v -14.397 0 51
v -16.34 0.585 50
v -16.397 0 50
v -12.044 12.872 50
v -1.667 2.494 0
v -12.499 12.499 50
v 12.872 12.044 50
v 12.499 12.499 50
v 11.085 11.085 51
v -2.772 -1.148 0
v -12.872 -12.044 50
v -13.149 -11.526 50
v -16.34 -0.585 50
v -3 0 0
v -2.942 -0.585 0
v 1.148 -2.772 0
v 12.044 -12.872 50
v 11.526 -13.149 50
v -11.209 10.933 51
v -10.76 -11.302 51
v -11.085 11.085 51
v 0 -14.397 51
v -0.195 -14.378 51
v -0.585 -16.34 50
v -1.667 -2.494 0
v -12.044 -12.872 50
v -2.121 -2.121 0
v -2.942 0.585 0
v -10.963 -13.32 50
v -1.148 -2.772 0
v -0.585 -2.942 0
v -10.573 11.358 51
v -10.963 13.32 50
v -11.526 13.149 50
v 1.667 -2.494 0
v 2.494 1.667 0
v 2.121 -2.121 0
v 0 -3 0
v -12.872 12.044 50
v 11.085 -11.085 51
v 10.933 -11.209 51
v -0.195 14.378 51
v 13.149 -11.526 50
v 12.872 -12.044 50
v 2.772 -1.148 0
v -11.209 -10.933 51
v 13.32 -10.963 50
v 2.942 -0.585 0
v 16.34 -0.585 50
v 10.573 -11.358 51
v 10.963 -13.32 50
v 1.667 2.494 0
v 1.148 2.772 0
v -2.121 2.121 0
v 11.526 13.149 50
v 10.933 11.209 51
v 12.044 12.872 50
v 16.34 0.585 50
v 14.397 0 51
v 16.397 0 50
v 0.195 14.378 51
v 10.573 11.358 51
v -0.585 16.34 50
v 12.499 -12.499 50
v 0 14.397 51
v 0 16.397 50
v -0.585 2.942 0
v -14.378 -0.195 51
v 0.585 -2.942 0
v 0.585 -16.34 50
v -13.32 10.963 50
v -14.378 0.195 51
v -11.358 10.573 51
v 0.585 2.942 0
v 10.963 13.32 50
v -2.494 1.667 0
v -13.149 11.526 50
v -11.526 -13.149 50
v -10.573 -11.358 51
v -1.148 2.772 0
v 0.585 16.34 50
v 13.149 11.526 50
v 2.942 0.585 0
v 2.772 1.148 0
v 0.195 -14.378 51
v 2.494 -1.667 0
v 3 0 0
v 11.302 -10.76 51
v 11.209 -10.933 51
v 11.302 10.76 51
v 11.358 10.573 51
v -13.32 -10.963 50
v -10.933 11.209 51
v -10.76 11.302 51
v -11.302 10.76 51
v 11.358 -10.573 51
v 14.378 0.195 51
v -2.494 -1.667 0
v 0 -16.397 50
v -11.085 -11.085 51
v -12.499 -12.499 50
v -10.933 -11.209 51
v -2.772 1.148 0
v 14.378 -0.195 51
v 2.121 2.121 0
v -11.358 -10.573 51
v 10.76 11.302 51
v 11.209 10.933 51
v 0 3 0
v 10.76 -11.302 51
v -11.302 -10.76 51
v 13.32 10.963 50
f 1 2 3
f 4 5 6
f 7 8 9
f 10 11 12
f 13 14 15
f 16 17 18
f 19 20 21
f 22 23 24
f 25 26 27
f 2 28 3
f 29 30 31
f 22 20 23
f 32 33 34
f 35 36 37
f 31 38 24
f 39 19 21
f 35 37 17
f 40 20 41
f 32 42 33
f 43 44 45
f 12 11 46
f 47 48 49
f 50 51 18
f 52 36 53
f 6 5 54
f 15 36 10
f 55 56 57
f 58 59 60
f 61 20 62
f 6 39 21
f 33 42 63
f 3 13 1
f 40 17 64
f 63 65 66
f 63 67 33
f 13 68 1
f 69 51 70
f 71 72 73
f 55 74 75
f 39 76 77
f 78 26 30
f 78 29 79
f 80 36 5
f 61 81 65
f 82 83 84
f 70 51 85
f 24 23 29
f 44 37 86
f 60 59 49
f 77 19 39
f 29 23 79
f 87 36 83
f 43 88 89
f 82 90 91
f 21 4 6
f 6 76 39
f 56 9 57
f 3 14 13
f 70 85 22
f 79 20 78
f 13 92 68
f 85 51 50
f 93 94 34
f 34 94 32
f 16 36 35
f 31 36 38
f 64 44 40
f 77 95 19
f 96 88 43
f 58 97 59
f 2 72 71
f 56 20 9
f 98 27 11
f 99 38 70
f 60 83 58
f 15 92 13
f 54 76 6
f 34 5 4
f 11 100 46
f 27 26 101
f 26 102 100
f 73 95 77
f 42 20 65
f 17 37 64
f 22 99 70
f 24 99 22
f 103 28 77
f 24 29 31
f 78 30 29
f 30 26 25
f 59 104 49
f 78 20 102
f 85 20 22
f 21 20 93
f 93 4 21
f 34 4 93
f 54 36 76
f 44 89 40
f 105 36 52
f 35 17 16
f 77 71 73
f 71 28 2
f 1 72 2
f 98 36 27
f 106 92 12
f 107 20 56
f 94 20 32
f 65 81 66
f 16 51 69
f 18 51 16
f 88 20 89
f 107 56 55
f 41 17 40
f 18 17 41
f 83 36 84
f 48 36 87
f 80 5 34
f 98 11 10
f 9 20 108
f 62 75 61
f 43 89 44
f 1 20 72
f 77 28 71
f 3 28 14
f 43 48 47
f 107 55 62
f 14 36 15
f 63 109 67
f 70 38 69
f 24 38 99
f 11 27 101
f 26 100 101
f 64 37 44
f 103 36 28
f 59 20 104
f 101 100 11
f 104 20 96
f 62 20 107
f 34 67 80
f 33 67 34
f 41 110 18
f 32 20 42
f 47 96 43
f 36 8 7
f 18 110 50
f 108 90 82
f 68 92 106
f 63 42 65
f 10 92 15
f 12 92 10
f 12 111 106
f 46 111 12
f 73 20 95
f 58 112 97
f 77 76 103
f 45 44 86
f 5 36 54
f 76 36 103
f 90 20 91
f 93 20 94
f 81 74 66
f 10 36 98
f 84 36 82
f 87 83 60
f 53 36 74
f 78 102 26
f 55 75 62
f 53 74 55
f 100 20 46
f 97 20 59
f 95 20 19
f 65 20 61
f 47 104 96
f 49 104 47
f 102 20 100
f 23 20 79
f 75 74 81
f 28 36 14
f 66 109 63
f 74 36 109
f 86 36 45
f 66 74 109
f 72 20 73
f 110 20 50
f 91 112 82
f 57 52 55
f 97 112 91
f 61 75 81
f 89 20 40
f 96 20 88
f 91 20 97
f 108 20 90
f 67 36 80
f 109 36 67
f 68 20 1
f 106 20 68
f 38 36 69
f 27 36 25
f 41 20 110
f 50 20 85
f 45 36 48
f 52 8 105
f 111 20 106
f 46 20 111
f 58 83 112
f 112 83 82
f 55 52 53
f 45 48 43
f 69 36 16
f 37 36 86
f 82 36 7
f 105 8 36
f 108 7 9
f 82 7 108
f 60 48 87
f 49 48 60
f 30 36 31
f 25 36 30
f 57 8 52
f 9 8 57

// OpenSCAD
$fn = 32;
gate_height = 50;


sq_poly = let(corner = 1 / sqrt(2)) [
  [corner, corner],
  [-corner, corner],
  [-corner, -corner],
  [corner, -corner]
];

oct_poly = let(corner = 1 / sqrt(2))[
  [1,0],
  [corner, corner],
  [0,1],
  [-corner, corner],
  [-1,0],
  [-corner, -corner],
  [0,-1],
  [corner, -corner],
];

octn_poly = let(corner = 1 / sqrt(2 / 1.2))[
  [1,0],
  [corner, corner],
  [0,1],
  [-corner, corner],
  [-1,0],
  [-corner, -corner],
  [0,-1],
  [corner, -corner],
];

function scale_xy_z(m, xy, z) = [ for (i = [0 : len(m) - 1]) [m[i].x * xy, m[i].y * xy, z]];

function throw_end(throw) = gate_height * tan(throw);

function throw_points(shape, throw) = concat([[0,0,0]],scale_xy_z(shape, throw_end(throw), gate_height));

function throw_faces(points) = [
  [each [1:len(points) - 1]],
  for(i =[1:len(points) - 1]) let (next = i < len(points) - 1 ? i + 1 : 1) [i, next, 0] 
];

module shape_gate (shape, throw, shaft_r, sharpness = 1) {
  
}

//echo(concat([[0,0,0]],scale_xy_z(sq_poly, 3, 3)));

echo(throw_points(sq_poly, 15));
echo(throw_faces(throw_points(sq_poly, 15)));

points = throw_points(octn_poly, 15);
faces = throw_faces(points);

minkowski() {
hull(){
  polyhedron(points, faces);
}
cylinder(1,3);
}
